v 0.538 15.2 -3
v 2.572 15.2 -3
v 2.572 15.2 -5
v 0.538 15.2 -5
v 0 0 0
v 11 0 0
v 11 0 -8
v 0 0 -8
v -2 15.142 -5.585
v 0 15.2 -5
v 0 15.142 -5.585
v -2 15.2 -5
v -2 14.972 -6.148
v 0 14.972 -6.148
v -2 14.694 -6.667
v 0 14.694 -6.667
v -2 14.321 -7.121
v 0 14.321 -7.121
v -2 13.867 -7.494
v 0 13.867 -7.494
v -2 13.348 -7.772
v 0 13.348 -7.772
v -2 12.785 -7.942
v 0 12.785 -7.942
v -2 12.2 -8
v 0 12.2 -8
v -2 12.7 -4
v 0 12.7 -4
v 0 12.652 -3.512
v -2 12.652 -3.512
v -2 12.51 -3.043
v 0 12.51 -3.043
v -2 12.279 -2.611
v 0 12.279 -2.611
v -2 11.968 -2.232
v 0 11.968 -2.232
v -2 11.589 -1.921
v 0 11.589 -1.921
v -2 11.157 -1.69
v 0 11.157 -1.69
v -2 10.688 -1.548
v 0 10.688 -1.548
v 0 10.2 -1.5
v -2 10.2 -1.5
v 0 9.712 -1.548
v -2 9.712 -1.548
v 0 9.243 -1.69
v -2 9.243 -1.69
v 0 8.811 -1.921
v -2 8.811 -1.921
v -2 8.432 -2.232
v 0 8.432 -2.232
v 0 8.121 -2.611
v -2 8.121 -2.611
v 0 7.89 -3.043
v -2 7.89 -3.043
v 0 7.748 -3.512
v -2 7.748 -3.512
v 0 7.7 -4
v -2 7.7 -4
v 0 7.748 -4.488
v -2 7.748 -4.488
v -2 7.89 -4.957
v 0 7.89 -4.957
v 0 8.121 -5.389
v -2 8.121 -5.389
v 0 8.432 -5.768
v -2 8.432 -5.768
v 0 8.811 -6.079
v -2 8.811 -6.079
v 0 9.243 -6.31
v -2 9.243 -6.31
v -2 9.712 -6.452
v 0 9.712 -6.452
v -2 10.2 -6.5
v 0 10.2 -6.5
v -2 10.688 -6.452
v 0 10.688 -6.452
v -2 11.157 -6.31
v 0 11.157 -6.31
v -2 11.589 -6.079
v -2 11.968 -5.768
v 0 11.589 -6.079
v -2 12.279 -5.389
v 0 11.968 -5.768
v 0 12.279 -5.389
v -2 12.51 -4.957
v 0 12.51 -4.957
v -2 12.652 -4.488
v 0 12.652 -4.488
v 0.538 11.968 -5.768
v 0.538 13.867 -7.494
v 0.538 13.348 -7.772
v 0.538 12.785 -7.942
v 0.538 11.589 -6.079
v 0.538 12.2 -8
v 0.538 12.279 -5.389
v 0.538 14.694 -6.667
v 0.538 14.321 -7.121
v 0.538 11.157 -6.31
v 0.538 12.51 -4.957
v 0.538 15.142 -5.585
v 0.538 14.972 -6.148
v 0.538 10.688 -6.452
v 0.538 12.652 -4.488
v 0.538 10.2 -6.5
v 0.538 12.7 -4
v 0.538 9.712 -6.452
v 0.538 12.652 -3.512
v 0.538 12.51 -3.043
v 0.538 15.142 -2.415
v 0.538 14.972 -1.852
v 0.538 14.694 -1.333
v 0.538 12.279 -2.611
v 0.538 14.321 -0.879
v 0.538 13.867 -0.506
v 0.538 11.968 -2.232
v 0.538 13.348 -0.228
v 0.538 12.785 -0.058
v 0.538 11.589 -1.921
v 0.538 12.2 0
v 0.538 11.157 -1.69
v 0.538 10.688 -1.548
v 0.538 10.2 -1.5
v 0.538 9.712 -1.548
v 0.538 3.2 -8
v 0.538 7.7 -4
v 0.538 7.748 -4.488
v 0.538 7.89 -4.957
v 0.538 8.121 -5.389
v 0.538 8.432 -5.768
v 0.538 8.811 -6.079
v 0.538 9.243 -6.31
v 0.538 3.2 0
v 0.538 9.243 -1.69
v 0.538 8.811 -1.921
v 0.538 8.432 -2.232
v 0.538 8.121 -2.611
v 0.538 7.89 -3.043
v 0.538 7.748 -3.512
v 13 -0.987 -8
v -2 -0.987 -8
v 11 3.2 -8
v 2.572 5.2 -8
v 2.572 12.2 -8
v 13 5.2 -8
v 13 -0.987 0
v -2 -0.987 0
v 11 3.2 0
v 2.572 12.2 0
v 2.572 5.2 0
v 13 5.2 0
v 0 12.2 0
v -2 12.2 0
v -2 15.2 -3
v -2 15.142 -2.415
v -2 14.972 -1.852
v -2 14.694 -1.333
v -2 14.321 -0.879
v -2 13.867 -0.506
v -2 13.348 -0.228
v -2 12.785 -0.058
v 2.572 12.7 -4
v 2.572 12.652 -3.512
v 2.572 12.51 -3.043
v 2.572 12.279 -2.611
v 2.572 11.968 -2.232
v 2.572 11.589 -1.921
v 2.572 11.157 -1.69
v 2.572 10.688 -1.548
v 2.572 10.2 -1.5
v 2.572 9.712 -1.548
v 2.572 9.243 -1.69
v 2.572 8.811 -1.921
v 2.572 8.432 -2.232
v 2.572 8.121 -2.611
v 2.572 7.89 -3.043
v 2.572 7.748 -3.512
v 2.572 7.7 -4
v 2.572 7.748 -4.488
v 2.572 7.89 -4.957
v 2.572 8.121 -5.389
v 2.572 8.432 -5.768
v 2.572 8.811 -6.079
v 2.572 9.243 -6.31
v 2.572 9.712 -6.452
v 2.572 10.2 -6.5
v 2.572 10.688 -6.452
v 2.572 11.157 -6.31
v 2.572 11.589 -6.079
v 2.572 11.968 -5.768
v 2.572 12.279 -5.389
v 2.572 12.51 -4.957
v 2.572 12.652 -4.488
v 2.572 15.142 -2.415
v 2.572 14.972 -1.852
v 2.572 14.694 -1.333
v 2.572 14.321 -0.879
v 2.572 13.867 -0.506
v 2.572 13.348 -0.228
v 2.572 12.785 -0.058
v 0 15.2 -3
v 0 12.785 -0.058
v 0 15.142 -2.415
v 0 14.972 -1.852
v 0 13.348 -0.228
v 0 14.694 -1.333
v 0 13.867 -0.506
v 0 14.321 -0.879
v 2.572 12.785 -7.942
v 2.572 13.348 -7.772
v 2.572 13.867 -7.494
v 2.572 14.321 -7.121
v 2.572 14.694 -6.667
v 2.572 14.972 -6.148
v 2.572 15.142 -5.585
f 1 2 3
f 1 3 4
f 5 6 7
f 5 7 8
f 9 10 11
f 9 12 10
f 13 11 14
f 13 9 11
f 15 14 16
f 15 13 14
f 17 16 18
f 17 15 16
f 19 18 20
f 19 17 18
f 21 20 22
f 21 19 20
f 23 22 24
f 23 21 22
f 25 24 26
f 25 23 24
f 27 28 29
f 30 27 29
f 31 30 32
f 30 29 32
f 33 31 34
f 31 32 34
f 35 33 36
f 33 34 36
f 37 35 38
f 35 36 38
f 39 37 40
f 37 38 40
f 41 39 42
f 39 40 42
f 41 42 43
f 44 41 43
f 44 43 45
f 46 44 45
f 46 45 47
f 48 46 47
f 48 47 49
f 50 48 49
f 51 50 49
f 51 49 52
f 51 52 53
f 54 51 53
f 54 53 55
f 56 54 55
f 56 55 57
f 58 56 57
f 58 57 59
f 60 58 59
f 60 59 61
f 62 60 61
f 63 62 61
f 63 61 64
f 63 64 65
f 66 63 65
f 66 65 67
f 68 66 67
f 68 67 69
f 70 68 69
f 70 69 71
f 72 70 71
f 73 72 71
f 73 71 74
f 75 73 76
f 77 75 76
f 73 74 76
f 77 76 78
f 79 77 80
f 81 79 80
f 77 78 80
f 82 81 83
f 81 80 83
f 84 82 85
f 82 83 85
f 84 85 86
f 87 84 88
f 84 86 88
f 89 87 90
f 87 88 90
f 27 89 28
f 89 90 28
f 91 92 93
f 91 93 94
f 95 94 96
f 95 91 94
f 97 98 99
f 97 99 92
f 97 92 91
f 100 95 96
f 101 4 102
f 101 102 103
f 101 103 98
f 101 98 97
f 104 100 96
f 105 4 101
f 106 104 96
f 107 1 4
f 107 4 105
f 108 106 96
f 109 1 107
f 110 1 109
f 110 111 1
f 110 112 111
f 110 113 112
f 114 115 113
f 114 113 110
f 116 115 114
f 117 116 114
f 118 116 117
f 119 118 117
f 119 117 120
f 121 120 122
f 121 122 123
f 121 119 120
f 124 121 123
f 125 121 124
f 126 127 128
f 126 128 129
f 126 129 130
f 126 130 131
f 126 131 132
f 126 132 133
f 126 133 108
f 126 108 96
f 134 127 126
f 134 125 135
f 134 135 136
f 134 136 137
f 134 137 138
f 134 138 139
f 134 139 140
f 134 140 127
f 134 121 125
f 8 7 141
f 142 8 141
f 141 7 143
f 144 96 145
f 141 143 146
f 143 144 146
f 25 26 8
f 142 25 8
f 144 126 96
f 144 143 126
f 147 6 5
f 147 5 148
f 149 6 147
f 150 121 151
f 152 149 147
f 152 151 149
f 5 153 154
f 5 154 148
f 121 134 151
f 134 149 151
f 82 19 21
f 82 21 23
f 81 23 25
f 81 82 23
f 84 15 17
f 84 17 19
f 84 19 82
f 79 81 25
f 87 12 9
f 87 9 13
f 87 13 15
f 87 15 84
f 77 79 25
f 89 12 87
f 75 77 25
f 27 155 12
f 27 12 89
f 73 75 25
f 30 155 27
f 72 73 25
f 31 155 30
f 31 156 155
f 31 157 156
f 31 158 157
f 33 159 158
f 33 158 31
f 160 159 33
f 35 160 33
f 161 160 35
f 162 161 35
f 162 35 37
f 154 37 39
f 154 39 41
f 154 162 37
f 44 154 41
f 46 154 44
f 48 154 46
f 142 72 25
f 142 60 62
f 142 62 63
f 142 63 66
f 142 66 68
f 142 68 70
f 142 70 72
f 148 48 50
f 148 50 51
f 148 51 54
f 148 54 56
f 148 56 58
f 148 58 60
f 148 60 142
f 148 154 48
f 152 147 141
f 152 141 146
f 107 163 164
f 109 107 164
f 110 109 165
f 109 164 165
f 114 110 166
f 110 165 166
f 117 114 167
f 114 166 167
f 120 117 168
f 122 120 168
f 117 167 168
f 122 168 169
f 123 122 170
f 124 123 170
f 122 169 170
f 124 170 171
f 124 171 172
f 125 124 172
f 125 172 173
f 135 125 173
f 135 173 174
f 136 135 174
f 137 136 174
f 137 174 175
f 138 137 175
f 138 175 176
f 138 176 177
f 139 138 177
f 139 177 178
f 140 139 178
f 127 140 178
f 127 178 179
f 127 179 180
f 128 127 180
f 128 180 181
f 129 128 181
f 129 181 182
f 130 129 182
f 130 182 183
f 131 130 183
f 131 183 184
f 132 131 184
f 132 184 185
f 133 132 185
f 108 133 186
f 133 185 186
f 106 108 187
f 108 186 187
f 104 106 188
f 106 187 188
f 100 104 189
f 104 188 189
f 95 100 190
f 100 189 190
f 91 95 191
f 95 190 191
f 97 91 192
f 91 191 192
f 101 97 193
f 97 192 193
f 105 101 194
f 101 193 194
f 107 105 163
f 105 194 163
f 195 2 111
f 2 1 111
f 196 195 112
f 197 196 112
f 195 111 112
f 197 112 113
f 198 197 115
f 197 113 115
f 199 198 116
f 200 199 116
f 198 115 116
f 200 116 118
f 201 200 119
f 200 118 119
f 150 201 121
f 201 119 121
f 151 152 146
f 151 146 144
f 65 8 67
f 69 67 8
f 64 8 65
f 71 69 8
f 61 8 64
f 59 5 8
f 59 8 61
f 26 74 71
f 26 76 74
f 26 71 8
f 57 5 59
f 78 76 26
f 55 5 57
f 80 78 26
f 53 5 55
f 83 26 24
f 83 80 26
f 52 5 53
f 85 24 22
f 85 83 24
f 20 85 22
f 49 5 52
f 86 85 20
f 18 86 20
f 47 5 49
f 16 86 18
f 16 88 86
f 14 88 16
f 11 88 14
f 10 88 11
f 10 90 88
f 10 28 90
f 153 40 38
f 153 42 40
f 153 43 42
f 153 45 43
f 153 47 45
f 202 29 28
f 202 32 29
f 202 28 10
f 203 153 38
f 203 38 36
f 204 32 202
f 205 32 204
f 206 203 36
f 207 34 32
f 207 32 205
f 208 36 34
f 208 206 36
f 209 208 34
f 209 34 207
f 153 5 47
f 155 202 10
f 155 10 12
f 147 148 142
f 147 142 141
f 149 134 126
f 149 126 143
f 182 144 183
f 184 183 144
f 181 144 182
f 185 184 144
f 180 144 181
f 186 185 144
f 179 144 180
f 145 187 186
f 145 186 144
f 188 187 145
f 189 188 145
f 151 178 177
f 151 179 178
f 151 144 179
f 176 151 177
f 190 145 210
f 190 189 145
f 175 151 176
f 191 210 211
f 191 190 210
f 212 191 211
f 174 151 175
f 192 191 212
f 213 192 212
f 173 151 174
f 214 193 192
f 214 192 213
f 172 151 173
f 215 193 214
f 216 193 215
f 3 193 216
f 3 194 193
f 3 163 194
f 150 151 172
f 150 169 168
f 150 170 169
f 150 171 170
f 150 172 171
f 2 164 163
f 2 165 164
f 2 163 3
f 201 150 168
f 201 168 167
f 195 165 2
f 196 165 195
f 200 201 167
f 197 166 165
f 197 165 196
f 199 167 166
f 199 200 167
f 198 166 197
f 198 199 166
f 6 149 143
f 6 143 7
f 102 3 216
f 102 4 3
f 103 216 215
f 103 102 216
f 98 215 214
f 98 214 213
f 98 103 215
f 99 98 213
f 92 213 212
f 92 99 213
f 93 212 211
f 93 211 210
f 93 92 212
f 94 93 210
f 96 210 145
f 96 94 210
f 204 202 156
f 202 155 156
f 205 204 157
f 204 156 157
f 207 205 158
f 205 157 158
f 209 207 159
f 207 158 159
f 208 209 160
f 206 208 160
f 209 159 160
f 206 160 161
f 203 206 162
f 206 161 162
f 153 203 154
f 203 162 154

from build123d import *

# Parameters (mm, degrees)
F1_DEPTH = 8
F3_R     = 3
F2_R     = 2.5
F4_DEPTH = 4.572962


with BuildPart() as f1:
    # F0 (on Top) → F1 (new body)
    with BuildSketch(Plane.XY):
        Polygon((0, 0), (0, 15.2), (-2, 15.2), (-2, -0.986916), (13, -0.986916), (13, 5.2), (2.571962, 5.2), (2.571962, 15.2), (0.571962, 15.2), (0.538318, 15.2), (0.538318, 3.2), (11, 3.2), (11, 0), align=None)
    extrude(amount=-F1_DEPTH)

    # F3
    f3_edges = [f1.edges().sort_by_distance(p)[0] for p in [
        (1.55514, 15.2, 0),
        (-1, 15.2, 0),
        (-1, 15.2, -8),
        (1.55514, 15.2, -8),
    ]]
    fillet(f3_edges, radius=F3_R)

    # F2 (on face) → F4 (cut, through all)
    with BuildSketch(Plane.YZ.offset(2.571962)):
        with Locations((10.2, -4)):
            Circle(F2_R)
    extrude(amount=-F4_DEPTH, mode=Mode.SUBTRACT)


solid = f1.part
